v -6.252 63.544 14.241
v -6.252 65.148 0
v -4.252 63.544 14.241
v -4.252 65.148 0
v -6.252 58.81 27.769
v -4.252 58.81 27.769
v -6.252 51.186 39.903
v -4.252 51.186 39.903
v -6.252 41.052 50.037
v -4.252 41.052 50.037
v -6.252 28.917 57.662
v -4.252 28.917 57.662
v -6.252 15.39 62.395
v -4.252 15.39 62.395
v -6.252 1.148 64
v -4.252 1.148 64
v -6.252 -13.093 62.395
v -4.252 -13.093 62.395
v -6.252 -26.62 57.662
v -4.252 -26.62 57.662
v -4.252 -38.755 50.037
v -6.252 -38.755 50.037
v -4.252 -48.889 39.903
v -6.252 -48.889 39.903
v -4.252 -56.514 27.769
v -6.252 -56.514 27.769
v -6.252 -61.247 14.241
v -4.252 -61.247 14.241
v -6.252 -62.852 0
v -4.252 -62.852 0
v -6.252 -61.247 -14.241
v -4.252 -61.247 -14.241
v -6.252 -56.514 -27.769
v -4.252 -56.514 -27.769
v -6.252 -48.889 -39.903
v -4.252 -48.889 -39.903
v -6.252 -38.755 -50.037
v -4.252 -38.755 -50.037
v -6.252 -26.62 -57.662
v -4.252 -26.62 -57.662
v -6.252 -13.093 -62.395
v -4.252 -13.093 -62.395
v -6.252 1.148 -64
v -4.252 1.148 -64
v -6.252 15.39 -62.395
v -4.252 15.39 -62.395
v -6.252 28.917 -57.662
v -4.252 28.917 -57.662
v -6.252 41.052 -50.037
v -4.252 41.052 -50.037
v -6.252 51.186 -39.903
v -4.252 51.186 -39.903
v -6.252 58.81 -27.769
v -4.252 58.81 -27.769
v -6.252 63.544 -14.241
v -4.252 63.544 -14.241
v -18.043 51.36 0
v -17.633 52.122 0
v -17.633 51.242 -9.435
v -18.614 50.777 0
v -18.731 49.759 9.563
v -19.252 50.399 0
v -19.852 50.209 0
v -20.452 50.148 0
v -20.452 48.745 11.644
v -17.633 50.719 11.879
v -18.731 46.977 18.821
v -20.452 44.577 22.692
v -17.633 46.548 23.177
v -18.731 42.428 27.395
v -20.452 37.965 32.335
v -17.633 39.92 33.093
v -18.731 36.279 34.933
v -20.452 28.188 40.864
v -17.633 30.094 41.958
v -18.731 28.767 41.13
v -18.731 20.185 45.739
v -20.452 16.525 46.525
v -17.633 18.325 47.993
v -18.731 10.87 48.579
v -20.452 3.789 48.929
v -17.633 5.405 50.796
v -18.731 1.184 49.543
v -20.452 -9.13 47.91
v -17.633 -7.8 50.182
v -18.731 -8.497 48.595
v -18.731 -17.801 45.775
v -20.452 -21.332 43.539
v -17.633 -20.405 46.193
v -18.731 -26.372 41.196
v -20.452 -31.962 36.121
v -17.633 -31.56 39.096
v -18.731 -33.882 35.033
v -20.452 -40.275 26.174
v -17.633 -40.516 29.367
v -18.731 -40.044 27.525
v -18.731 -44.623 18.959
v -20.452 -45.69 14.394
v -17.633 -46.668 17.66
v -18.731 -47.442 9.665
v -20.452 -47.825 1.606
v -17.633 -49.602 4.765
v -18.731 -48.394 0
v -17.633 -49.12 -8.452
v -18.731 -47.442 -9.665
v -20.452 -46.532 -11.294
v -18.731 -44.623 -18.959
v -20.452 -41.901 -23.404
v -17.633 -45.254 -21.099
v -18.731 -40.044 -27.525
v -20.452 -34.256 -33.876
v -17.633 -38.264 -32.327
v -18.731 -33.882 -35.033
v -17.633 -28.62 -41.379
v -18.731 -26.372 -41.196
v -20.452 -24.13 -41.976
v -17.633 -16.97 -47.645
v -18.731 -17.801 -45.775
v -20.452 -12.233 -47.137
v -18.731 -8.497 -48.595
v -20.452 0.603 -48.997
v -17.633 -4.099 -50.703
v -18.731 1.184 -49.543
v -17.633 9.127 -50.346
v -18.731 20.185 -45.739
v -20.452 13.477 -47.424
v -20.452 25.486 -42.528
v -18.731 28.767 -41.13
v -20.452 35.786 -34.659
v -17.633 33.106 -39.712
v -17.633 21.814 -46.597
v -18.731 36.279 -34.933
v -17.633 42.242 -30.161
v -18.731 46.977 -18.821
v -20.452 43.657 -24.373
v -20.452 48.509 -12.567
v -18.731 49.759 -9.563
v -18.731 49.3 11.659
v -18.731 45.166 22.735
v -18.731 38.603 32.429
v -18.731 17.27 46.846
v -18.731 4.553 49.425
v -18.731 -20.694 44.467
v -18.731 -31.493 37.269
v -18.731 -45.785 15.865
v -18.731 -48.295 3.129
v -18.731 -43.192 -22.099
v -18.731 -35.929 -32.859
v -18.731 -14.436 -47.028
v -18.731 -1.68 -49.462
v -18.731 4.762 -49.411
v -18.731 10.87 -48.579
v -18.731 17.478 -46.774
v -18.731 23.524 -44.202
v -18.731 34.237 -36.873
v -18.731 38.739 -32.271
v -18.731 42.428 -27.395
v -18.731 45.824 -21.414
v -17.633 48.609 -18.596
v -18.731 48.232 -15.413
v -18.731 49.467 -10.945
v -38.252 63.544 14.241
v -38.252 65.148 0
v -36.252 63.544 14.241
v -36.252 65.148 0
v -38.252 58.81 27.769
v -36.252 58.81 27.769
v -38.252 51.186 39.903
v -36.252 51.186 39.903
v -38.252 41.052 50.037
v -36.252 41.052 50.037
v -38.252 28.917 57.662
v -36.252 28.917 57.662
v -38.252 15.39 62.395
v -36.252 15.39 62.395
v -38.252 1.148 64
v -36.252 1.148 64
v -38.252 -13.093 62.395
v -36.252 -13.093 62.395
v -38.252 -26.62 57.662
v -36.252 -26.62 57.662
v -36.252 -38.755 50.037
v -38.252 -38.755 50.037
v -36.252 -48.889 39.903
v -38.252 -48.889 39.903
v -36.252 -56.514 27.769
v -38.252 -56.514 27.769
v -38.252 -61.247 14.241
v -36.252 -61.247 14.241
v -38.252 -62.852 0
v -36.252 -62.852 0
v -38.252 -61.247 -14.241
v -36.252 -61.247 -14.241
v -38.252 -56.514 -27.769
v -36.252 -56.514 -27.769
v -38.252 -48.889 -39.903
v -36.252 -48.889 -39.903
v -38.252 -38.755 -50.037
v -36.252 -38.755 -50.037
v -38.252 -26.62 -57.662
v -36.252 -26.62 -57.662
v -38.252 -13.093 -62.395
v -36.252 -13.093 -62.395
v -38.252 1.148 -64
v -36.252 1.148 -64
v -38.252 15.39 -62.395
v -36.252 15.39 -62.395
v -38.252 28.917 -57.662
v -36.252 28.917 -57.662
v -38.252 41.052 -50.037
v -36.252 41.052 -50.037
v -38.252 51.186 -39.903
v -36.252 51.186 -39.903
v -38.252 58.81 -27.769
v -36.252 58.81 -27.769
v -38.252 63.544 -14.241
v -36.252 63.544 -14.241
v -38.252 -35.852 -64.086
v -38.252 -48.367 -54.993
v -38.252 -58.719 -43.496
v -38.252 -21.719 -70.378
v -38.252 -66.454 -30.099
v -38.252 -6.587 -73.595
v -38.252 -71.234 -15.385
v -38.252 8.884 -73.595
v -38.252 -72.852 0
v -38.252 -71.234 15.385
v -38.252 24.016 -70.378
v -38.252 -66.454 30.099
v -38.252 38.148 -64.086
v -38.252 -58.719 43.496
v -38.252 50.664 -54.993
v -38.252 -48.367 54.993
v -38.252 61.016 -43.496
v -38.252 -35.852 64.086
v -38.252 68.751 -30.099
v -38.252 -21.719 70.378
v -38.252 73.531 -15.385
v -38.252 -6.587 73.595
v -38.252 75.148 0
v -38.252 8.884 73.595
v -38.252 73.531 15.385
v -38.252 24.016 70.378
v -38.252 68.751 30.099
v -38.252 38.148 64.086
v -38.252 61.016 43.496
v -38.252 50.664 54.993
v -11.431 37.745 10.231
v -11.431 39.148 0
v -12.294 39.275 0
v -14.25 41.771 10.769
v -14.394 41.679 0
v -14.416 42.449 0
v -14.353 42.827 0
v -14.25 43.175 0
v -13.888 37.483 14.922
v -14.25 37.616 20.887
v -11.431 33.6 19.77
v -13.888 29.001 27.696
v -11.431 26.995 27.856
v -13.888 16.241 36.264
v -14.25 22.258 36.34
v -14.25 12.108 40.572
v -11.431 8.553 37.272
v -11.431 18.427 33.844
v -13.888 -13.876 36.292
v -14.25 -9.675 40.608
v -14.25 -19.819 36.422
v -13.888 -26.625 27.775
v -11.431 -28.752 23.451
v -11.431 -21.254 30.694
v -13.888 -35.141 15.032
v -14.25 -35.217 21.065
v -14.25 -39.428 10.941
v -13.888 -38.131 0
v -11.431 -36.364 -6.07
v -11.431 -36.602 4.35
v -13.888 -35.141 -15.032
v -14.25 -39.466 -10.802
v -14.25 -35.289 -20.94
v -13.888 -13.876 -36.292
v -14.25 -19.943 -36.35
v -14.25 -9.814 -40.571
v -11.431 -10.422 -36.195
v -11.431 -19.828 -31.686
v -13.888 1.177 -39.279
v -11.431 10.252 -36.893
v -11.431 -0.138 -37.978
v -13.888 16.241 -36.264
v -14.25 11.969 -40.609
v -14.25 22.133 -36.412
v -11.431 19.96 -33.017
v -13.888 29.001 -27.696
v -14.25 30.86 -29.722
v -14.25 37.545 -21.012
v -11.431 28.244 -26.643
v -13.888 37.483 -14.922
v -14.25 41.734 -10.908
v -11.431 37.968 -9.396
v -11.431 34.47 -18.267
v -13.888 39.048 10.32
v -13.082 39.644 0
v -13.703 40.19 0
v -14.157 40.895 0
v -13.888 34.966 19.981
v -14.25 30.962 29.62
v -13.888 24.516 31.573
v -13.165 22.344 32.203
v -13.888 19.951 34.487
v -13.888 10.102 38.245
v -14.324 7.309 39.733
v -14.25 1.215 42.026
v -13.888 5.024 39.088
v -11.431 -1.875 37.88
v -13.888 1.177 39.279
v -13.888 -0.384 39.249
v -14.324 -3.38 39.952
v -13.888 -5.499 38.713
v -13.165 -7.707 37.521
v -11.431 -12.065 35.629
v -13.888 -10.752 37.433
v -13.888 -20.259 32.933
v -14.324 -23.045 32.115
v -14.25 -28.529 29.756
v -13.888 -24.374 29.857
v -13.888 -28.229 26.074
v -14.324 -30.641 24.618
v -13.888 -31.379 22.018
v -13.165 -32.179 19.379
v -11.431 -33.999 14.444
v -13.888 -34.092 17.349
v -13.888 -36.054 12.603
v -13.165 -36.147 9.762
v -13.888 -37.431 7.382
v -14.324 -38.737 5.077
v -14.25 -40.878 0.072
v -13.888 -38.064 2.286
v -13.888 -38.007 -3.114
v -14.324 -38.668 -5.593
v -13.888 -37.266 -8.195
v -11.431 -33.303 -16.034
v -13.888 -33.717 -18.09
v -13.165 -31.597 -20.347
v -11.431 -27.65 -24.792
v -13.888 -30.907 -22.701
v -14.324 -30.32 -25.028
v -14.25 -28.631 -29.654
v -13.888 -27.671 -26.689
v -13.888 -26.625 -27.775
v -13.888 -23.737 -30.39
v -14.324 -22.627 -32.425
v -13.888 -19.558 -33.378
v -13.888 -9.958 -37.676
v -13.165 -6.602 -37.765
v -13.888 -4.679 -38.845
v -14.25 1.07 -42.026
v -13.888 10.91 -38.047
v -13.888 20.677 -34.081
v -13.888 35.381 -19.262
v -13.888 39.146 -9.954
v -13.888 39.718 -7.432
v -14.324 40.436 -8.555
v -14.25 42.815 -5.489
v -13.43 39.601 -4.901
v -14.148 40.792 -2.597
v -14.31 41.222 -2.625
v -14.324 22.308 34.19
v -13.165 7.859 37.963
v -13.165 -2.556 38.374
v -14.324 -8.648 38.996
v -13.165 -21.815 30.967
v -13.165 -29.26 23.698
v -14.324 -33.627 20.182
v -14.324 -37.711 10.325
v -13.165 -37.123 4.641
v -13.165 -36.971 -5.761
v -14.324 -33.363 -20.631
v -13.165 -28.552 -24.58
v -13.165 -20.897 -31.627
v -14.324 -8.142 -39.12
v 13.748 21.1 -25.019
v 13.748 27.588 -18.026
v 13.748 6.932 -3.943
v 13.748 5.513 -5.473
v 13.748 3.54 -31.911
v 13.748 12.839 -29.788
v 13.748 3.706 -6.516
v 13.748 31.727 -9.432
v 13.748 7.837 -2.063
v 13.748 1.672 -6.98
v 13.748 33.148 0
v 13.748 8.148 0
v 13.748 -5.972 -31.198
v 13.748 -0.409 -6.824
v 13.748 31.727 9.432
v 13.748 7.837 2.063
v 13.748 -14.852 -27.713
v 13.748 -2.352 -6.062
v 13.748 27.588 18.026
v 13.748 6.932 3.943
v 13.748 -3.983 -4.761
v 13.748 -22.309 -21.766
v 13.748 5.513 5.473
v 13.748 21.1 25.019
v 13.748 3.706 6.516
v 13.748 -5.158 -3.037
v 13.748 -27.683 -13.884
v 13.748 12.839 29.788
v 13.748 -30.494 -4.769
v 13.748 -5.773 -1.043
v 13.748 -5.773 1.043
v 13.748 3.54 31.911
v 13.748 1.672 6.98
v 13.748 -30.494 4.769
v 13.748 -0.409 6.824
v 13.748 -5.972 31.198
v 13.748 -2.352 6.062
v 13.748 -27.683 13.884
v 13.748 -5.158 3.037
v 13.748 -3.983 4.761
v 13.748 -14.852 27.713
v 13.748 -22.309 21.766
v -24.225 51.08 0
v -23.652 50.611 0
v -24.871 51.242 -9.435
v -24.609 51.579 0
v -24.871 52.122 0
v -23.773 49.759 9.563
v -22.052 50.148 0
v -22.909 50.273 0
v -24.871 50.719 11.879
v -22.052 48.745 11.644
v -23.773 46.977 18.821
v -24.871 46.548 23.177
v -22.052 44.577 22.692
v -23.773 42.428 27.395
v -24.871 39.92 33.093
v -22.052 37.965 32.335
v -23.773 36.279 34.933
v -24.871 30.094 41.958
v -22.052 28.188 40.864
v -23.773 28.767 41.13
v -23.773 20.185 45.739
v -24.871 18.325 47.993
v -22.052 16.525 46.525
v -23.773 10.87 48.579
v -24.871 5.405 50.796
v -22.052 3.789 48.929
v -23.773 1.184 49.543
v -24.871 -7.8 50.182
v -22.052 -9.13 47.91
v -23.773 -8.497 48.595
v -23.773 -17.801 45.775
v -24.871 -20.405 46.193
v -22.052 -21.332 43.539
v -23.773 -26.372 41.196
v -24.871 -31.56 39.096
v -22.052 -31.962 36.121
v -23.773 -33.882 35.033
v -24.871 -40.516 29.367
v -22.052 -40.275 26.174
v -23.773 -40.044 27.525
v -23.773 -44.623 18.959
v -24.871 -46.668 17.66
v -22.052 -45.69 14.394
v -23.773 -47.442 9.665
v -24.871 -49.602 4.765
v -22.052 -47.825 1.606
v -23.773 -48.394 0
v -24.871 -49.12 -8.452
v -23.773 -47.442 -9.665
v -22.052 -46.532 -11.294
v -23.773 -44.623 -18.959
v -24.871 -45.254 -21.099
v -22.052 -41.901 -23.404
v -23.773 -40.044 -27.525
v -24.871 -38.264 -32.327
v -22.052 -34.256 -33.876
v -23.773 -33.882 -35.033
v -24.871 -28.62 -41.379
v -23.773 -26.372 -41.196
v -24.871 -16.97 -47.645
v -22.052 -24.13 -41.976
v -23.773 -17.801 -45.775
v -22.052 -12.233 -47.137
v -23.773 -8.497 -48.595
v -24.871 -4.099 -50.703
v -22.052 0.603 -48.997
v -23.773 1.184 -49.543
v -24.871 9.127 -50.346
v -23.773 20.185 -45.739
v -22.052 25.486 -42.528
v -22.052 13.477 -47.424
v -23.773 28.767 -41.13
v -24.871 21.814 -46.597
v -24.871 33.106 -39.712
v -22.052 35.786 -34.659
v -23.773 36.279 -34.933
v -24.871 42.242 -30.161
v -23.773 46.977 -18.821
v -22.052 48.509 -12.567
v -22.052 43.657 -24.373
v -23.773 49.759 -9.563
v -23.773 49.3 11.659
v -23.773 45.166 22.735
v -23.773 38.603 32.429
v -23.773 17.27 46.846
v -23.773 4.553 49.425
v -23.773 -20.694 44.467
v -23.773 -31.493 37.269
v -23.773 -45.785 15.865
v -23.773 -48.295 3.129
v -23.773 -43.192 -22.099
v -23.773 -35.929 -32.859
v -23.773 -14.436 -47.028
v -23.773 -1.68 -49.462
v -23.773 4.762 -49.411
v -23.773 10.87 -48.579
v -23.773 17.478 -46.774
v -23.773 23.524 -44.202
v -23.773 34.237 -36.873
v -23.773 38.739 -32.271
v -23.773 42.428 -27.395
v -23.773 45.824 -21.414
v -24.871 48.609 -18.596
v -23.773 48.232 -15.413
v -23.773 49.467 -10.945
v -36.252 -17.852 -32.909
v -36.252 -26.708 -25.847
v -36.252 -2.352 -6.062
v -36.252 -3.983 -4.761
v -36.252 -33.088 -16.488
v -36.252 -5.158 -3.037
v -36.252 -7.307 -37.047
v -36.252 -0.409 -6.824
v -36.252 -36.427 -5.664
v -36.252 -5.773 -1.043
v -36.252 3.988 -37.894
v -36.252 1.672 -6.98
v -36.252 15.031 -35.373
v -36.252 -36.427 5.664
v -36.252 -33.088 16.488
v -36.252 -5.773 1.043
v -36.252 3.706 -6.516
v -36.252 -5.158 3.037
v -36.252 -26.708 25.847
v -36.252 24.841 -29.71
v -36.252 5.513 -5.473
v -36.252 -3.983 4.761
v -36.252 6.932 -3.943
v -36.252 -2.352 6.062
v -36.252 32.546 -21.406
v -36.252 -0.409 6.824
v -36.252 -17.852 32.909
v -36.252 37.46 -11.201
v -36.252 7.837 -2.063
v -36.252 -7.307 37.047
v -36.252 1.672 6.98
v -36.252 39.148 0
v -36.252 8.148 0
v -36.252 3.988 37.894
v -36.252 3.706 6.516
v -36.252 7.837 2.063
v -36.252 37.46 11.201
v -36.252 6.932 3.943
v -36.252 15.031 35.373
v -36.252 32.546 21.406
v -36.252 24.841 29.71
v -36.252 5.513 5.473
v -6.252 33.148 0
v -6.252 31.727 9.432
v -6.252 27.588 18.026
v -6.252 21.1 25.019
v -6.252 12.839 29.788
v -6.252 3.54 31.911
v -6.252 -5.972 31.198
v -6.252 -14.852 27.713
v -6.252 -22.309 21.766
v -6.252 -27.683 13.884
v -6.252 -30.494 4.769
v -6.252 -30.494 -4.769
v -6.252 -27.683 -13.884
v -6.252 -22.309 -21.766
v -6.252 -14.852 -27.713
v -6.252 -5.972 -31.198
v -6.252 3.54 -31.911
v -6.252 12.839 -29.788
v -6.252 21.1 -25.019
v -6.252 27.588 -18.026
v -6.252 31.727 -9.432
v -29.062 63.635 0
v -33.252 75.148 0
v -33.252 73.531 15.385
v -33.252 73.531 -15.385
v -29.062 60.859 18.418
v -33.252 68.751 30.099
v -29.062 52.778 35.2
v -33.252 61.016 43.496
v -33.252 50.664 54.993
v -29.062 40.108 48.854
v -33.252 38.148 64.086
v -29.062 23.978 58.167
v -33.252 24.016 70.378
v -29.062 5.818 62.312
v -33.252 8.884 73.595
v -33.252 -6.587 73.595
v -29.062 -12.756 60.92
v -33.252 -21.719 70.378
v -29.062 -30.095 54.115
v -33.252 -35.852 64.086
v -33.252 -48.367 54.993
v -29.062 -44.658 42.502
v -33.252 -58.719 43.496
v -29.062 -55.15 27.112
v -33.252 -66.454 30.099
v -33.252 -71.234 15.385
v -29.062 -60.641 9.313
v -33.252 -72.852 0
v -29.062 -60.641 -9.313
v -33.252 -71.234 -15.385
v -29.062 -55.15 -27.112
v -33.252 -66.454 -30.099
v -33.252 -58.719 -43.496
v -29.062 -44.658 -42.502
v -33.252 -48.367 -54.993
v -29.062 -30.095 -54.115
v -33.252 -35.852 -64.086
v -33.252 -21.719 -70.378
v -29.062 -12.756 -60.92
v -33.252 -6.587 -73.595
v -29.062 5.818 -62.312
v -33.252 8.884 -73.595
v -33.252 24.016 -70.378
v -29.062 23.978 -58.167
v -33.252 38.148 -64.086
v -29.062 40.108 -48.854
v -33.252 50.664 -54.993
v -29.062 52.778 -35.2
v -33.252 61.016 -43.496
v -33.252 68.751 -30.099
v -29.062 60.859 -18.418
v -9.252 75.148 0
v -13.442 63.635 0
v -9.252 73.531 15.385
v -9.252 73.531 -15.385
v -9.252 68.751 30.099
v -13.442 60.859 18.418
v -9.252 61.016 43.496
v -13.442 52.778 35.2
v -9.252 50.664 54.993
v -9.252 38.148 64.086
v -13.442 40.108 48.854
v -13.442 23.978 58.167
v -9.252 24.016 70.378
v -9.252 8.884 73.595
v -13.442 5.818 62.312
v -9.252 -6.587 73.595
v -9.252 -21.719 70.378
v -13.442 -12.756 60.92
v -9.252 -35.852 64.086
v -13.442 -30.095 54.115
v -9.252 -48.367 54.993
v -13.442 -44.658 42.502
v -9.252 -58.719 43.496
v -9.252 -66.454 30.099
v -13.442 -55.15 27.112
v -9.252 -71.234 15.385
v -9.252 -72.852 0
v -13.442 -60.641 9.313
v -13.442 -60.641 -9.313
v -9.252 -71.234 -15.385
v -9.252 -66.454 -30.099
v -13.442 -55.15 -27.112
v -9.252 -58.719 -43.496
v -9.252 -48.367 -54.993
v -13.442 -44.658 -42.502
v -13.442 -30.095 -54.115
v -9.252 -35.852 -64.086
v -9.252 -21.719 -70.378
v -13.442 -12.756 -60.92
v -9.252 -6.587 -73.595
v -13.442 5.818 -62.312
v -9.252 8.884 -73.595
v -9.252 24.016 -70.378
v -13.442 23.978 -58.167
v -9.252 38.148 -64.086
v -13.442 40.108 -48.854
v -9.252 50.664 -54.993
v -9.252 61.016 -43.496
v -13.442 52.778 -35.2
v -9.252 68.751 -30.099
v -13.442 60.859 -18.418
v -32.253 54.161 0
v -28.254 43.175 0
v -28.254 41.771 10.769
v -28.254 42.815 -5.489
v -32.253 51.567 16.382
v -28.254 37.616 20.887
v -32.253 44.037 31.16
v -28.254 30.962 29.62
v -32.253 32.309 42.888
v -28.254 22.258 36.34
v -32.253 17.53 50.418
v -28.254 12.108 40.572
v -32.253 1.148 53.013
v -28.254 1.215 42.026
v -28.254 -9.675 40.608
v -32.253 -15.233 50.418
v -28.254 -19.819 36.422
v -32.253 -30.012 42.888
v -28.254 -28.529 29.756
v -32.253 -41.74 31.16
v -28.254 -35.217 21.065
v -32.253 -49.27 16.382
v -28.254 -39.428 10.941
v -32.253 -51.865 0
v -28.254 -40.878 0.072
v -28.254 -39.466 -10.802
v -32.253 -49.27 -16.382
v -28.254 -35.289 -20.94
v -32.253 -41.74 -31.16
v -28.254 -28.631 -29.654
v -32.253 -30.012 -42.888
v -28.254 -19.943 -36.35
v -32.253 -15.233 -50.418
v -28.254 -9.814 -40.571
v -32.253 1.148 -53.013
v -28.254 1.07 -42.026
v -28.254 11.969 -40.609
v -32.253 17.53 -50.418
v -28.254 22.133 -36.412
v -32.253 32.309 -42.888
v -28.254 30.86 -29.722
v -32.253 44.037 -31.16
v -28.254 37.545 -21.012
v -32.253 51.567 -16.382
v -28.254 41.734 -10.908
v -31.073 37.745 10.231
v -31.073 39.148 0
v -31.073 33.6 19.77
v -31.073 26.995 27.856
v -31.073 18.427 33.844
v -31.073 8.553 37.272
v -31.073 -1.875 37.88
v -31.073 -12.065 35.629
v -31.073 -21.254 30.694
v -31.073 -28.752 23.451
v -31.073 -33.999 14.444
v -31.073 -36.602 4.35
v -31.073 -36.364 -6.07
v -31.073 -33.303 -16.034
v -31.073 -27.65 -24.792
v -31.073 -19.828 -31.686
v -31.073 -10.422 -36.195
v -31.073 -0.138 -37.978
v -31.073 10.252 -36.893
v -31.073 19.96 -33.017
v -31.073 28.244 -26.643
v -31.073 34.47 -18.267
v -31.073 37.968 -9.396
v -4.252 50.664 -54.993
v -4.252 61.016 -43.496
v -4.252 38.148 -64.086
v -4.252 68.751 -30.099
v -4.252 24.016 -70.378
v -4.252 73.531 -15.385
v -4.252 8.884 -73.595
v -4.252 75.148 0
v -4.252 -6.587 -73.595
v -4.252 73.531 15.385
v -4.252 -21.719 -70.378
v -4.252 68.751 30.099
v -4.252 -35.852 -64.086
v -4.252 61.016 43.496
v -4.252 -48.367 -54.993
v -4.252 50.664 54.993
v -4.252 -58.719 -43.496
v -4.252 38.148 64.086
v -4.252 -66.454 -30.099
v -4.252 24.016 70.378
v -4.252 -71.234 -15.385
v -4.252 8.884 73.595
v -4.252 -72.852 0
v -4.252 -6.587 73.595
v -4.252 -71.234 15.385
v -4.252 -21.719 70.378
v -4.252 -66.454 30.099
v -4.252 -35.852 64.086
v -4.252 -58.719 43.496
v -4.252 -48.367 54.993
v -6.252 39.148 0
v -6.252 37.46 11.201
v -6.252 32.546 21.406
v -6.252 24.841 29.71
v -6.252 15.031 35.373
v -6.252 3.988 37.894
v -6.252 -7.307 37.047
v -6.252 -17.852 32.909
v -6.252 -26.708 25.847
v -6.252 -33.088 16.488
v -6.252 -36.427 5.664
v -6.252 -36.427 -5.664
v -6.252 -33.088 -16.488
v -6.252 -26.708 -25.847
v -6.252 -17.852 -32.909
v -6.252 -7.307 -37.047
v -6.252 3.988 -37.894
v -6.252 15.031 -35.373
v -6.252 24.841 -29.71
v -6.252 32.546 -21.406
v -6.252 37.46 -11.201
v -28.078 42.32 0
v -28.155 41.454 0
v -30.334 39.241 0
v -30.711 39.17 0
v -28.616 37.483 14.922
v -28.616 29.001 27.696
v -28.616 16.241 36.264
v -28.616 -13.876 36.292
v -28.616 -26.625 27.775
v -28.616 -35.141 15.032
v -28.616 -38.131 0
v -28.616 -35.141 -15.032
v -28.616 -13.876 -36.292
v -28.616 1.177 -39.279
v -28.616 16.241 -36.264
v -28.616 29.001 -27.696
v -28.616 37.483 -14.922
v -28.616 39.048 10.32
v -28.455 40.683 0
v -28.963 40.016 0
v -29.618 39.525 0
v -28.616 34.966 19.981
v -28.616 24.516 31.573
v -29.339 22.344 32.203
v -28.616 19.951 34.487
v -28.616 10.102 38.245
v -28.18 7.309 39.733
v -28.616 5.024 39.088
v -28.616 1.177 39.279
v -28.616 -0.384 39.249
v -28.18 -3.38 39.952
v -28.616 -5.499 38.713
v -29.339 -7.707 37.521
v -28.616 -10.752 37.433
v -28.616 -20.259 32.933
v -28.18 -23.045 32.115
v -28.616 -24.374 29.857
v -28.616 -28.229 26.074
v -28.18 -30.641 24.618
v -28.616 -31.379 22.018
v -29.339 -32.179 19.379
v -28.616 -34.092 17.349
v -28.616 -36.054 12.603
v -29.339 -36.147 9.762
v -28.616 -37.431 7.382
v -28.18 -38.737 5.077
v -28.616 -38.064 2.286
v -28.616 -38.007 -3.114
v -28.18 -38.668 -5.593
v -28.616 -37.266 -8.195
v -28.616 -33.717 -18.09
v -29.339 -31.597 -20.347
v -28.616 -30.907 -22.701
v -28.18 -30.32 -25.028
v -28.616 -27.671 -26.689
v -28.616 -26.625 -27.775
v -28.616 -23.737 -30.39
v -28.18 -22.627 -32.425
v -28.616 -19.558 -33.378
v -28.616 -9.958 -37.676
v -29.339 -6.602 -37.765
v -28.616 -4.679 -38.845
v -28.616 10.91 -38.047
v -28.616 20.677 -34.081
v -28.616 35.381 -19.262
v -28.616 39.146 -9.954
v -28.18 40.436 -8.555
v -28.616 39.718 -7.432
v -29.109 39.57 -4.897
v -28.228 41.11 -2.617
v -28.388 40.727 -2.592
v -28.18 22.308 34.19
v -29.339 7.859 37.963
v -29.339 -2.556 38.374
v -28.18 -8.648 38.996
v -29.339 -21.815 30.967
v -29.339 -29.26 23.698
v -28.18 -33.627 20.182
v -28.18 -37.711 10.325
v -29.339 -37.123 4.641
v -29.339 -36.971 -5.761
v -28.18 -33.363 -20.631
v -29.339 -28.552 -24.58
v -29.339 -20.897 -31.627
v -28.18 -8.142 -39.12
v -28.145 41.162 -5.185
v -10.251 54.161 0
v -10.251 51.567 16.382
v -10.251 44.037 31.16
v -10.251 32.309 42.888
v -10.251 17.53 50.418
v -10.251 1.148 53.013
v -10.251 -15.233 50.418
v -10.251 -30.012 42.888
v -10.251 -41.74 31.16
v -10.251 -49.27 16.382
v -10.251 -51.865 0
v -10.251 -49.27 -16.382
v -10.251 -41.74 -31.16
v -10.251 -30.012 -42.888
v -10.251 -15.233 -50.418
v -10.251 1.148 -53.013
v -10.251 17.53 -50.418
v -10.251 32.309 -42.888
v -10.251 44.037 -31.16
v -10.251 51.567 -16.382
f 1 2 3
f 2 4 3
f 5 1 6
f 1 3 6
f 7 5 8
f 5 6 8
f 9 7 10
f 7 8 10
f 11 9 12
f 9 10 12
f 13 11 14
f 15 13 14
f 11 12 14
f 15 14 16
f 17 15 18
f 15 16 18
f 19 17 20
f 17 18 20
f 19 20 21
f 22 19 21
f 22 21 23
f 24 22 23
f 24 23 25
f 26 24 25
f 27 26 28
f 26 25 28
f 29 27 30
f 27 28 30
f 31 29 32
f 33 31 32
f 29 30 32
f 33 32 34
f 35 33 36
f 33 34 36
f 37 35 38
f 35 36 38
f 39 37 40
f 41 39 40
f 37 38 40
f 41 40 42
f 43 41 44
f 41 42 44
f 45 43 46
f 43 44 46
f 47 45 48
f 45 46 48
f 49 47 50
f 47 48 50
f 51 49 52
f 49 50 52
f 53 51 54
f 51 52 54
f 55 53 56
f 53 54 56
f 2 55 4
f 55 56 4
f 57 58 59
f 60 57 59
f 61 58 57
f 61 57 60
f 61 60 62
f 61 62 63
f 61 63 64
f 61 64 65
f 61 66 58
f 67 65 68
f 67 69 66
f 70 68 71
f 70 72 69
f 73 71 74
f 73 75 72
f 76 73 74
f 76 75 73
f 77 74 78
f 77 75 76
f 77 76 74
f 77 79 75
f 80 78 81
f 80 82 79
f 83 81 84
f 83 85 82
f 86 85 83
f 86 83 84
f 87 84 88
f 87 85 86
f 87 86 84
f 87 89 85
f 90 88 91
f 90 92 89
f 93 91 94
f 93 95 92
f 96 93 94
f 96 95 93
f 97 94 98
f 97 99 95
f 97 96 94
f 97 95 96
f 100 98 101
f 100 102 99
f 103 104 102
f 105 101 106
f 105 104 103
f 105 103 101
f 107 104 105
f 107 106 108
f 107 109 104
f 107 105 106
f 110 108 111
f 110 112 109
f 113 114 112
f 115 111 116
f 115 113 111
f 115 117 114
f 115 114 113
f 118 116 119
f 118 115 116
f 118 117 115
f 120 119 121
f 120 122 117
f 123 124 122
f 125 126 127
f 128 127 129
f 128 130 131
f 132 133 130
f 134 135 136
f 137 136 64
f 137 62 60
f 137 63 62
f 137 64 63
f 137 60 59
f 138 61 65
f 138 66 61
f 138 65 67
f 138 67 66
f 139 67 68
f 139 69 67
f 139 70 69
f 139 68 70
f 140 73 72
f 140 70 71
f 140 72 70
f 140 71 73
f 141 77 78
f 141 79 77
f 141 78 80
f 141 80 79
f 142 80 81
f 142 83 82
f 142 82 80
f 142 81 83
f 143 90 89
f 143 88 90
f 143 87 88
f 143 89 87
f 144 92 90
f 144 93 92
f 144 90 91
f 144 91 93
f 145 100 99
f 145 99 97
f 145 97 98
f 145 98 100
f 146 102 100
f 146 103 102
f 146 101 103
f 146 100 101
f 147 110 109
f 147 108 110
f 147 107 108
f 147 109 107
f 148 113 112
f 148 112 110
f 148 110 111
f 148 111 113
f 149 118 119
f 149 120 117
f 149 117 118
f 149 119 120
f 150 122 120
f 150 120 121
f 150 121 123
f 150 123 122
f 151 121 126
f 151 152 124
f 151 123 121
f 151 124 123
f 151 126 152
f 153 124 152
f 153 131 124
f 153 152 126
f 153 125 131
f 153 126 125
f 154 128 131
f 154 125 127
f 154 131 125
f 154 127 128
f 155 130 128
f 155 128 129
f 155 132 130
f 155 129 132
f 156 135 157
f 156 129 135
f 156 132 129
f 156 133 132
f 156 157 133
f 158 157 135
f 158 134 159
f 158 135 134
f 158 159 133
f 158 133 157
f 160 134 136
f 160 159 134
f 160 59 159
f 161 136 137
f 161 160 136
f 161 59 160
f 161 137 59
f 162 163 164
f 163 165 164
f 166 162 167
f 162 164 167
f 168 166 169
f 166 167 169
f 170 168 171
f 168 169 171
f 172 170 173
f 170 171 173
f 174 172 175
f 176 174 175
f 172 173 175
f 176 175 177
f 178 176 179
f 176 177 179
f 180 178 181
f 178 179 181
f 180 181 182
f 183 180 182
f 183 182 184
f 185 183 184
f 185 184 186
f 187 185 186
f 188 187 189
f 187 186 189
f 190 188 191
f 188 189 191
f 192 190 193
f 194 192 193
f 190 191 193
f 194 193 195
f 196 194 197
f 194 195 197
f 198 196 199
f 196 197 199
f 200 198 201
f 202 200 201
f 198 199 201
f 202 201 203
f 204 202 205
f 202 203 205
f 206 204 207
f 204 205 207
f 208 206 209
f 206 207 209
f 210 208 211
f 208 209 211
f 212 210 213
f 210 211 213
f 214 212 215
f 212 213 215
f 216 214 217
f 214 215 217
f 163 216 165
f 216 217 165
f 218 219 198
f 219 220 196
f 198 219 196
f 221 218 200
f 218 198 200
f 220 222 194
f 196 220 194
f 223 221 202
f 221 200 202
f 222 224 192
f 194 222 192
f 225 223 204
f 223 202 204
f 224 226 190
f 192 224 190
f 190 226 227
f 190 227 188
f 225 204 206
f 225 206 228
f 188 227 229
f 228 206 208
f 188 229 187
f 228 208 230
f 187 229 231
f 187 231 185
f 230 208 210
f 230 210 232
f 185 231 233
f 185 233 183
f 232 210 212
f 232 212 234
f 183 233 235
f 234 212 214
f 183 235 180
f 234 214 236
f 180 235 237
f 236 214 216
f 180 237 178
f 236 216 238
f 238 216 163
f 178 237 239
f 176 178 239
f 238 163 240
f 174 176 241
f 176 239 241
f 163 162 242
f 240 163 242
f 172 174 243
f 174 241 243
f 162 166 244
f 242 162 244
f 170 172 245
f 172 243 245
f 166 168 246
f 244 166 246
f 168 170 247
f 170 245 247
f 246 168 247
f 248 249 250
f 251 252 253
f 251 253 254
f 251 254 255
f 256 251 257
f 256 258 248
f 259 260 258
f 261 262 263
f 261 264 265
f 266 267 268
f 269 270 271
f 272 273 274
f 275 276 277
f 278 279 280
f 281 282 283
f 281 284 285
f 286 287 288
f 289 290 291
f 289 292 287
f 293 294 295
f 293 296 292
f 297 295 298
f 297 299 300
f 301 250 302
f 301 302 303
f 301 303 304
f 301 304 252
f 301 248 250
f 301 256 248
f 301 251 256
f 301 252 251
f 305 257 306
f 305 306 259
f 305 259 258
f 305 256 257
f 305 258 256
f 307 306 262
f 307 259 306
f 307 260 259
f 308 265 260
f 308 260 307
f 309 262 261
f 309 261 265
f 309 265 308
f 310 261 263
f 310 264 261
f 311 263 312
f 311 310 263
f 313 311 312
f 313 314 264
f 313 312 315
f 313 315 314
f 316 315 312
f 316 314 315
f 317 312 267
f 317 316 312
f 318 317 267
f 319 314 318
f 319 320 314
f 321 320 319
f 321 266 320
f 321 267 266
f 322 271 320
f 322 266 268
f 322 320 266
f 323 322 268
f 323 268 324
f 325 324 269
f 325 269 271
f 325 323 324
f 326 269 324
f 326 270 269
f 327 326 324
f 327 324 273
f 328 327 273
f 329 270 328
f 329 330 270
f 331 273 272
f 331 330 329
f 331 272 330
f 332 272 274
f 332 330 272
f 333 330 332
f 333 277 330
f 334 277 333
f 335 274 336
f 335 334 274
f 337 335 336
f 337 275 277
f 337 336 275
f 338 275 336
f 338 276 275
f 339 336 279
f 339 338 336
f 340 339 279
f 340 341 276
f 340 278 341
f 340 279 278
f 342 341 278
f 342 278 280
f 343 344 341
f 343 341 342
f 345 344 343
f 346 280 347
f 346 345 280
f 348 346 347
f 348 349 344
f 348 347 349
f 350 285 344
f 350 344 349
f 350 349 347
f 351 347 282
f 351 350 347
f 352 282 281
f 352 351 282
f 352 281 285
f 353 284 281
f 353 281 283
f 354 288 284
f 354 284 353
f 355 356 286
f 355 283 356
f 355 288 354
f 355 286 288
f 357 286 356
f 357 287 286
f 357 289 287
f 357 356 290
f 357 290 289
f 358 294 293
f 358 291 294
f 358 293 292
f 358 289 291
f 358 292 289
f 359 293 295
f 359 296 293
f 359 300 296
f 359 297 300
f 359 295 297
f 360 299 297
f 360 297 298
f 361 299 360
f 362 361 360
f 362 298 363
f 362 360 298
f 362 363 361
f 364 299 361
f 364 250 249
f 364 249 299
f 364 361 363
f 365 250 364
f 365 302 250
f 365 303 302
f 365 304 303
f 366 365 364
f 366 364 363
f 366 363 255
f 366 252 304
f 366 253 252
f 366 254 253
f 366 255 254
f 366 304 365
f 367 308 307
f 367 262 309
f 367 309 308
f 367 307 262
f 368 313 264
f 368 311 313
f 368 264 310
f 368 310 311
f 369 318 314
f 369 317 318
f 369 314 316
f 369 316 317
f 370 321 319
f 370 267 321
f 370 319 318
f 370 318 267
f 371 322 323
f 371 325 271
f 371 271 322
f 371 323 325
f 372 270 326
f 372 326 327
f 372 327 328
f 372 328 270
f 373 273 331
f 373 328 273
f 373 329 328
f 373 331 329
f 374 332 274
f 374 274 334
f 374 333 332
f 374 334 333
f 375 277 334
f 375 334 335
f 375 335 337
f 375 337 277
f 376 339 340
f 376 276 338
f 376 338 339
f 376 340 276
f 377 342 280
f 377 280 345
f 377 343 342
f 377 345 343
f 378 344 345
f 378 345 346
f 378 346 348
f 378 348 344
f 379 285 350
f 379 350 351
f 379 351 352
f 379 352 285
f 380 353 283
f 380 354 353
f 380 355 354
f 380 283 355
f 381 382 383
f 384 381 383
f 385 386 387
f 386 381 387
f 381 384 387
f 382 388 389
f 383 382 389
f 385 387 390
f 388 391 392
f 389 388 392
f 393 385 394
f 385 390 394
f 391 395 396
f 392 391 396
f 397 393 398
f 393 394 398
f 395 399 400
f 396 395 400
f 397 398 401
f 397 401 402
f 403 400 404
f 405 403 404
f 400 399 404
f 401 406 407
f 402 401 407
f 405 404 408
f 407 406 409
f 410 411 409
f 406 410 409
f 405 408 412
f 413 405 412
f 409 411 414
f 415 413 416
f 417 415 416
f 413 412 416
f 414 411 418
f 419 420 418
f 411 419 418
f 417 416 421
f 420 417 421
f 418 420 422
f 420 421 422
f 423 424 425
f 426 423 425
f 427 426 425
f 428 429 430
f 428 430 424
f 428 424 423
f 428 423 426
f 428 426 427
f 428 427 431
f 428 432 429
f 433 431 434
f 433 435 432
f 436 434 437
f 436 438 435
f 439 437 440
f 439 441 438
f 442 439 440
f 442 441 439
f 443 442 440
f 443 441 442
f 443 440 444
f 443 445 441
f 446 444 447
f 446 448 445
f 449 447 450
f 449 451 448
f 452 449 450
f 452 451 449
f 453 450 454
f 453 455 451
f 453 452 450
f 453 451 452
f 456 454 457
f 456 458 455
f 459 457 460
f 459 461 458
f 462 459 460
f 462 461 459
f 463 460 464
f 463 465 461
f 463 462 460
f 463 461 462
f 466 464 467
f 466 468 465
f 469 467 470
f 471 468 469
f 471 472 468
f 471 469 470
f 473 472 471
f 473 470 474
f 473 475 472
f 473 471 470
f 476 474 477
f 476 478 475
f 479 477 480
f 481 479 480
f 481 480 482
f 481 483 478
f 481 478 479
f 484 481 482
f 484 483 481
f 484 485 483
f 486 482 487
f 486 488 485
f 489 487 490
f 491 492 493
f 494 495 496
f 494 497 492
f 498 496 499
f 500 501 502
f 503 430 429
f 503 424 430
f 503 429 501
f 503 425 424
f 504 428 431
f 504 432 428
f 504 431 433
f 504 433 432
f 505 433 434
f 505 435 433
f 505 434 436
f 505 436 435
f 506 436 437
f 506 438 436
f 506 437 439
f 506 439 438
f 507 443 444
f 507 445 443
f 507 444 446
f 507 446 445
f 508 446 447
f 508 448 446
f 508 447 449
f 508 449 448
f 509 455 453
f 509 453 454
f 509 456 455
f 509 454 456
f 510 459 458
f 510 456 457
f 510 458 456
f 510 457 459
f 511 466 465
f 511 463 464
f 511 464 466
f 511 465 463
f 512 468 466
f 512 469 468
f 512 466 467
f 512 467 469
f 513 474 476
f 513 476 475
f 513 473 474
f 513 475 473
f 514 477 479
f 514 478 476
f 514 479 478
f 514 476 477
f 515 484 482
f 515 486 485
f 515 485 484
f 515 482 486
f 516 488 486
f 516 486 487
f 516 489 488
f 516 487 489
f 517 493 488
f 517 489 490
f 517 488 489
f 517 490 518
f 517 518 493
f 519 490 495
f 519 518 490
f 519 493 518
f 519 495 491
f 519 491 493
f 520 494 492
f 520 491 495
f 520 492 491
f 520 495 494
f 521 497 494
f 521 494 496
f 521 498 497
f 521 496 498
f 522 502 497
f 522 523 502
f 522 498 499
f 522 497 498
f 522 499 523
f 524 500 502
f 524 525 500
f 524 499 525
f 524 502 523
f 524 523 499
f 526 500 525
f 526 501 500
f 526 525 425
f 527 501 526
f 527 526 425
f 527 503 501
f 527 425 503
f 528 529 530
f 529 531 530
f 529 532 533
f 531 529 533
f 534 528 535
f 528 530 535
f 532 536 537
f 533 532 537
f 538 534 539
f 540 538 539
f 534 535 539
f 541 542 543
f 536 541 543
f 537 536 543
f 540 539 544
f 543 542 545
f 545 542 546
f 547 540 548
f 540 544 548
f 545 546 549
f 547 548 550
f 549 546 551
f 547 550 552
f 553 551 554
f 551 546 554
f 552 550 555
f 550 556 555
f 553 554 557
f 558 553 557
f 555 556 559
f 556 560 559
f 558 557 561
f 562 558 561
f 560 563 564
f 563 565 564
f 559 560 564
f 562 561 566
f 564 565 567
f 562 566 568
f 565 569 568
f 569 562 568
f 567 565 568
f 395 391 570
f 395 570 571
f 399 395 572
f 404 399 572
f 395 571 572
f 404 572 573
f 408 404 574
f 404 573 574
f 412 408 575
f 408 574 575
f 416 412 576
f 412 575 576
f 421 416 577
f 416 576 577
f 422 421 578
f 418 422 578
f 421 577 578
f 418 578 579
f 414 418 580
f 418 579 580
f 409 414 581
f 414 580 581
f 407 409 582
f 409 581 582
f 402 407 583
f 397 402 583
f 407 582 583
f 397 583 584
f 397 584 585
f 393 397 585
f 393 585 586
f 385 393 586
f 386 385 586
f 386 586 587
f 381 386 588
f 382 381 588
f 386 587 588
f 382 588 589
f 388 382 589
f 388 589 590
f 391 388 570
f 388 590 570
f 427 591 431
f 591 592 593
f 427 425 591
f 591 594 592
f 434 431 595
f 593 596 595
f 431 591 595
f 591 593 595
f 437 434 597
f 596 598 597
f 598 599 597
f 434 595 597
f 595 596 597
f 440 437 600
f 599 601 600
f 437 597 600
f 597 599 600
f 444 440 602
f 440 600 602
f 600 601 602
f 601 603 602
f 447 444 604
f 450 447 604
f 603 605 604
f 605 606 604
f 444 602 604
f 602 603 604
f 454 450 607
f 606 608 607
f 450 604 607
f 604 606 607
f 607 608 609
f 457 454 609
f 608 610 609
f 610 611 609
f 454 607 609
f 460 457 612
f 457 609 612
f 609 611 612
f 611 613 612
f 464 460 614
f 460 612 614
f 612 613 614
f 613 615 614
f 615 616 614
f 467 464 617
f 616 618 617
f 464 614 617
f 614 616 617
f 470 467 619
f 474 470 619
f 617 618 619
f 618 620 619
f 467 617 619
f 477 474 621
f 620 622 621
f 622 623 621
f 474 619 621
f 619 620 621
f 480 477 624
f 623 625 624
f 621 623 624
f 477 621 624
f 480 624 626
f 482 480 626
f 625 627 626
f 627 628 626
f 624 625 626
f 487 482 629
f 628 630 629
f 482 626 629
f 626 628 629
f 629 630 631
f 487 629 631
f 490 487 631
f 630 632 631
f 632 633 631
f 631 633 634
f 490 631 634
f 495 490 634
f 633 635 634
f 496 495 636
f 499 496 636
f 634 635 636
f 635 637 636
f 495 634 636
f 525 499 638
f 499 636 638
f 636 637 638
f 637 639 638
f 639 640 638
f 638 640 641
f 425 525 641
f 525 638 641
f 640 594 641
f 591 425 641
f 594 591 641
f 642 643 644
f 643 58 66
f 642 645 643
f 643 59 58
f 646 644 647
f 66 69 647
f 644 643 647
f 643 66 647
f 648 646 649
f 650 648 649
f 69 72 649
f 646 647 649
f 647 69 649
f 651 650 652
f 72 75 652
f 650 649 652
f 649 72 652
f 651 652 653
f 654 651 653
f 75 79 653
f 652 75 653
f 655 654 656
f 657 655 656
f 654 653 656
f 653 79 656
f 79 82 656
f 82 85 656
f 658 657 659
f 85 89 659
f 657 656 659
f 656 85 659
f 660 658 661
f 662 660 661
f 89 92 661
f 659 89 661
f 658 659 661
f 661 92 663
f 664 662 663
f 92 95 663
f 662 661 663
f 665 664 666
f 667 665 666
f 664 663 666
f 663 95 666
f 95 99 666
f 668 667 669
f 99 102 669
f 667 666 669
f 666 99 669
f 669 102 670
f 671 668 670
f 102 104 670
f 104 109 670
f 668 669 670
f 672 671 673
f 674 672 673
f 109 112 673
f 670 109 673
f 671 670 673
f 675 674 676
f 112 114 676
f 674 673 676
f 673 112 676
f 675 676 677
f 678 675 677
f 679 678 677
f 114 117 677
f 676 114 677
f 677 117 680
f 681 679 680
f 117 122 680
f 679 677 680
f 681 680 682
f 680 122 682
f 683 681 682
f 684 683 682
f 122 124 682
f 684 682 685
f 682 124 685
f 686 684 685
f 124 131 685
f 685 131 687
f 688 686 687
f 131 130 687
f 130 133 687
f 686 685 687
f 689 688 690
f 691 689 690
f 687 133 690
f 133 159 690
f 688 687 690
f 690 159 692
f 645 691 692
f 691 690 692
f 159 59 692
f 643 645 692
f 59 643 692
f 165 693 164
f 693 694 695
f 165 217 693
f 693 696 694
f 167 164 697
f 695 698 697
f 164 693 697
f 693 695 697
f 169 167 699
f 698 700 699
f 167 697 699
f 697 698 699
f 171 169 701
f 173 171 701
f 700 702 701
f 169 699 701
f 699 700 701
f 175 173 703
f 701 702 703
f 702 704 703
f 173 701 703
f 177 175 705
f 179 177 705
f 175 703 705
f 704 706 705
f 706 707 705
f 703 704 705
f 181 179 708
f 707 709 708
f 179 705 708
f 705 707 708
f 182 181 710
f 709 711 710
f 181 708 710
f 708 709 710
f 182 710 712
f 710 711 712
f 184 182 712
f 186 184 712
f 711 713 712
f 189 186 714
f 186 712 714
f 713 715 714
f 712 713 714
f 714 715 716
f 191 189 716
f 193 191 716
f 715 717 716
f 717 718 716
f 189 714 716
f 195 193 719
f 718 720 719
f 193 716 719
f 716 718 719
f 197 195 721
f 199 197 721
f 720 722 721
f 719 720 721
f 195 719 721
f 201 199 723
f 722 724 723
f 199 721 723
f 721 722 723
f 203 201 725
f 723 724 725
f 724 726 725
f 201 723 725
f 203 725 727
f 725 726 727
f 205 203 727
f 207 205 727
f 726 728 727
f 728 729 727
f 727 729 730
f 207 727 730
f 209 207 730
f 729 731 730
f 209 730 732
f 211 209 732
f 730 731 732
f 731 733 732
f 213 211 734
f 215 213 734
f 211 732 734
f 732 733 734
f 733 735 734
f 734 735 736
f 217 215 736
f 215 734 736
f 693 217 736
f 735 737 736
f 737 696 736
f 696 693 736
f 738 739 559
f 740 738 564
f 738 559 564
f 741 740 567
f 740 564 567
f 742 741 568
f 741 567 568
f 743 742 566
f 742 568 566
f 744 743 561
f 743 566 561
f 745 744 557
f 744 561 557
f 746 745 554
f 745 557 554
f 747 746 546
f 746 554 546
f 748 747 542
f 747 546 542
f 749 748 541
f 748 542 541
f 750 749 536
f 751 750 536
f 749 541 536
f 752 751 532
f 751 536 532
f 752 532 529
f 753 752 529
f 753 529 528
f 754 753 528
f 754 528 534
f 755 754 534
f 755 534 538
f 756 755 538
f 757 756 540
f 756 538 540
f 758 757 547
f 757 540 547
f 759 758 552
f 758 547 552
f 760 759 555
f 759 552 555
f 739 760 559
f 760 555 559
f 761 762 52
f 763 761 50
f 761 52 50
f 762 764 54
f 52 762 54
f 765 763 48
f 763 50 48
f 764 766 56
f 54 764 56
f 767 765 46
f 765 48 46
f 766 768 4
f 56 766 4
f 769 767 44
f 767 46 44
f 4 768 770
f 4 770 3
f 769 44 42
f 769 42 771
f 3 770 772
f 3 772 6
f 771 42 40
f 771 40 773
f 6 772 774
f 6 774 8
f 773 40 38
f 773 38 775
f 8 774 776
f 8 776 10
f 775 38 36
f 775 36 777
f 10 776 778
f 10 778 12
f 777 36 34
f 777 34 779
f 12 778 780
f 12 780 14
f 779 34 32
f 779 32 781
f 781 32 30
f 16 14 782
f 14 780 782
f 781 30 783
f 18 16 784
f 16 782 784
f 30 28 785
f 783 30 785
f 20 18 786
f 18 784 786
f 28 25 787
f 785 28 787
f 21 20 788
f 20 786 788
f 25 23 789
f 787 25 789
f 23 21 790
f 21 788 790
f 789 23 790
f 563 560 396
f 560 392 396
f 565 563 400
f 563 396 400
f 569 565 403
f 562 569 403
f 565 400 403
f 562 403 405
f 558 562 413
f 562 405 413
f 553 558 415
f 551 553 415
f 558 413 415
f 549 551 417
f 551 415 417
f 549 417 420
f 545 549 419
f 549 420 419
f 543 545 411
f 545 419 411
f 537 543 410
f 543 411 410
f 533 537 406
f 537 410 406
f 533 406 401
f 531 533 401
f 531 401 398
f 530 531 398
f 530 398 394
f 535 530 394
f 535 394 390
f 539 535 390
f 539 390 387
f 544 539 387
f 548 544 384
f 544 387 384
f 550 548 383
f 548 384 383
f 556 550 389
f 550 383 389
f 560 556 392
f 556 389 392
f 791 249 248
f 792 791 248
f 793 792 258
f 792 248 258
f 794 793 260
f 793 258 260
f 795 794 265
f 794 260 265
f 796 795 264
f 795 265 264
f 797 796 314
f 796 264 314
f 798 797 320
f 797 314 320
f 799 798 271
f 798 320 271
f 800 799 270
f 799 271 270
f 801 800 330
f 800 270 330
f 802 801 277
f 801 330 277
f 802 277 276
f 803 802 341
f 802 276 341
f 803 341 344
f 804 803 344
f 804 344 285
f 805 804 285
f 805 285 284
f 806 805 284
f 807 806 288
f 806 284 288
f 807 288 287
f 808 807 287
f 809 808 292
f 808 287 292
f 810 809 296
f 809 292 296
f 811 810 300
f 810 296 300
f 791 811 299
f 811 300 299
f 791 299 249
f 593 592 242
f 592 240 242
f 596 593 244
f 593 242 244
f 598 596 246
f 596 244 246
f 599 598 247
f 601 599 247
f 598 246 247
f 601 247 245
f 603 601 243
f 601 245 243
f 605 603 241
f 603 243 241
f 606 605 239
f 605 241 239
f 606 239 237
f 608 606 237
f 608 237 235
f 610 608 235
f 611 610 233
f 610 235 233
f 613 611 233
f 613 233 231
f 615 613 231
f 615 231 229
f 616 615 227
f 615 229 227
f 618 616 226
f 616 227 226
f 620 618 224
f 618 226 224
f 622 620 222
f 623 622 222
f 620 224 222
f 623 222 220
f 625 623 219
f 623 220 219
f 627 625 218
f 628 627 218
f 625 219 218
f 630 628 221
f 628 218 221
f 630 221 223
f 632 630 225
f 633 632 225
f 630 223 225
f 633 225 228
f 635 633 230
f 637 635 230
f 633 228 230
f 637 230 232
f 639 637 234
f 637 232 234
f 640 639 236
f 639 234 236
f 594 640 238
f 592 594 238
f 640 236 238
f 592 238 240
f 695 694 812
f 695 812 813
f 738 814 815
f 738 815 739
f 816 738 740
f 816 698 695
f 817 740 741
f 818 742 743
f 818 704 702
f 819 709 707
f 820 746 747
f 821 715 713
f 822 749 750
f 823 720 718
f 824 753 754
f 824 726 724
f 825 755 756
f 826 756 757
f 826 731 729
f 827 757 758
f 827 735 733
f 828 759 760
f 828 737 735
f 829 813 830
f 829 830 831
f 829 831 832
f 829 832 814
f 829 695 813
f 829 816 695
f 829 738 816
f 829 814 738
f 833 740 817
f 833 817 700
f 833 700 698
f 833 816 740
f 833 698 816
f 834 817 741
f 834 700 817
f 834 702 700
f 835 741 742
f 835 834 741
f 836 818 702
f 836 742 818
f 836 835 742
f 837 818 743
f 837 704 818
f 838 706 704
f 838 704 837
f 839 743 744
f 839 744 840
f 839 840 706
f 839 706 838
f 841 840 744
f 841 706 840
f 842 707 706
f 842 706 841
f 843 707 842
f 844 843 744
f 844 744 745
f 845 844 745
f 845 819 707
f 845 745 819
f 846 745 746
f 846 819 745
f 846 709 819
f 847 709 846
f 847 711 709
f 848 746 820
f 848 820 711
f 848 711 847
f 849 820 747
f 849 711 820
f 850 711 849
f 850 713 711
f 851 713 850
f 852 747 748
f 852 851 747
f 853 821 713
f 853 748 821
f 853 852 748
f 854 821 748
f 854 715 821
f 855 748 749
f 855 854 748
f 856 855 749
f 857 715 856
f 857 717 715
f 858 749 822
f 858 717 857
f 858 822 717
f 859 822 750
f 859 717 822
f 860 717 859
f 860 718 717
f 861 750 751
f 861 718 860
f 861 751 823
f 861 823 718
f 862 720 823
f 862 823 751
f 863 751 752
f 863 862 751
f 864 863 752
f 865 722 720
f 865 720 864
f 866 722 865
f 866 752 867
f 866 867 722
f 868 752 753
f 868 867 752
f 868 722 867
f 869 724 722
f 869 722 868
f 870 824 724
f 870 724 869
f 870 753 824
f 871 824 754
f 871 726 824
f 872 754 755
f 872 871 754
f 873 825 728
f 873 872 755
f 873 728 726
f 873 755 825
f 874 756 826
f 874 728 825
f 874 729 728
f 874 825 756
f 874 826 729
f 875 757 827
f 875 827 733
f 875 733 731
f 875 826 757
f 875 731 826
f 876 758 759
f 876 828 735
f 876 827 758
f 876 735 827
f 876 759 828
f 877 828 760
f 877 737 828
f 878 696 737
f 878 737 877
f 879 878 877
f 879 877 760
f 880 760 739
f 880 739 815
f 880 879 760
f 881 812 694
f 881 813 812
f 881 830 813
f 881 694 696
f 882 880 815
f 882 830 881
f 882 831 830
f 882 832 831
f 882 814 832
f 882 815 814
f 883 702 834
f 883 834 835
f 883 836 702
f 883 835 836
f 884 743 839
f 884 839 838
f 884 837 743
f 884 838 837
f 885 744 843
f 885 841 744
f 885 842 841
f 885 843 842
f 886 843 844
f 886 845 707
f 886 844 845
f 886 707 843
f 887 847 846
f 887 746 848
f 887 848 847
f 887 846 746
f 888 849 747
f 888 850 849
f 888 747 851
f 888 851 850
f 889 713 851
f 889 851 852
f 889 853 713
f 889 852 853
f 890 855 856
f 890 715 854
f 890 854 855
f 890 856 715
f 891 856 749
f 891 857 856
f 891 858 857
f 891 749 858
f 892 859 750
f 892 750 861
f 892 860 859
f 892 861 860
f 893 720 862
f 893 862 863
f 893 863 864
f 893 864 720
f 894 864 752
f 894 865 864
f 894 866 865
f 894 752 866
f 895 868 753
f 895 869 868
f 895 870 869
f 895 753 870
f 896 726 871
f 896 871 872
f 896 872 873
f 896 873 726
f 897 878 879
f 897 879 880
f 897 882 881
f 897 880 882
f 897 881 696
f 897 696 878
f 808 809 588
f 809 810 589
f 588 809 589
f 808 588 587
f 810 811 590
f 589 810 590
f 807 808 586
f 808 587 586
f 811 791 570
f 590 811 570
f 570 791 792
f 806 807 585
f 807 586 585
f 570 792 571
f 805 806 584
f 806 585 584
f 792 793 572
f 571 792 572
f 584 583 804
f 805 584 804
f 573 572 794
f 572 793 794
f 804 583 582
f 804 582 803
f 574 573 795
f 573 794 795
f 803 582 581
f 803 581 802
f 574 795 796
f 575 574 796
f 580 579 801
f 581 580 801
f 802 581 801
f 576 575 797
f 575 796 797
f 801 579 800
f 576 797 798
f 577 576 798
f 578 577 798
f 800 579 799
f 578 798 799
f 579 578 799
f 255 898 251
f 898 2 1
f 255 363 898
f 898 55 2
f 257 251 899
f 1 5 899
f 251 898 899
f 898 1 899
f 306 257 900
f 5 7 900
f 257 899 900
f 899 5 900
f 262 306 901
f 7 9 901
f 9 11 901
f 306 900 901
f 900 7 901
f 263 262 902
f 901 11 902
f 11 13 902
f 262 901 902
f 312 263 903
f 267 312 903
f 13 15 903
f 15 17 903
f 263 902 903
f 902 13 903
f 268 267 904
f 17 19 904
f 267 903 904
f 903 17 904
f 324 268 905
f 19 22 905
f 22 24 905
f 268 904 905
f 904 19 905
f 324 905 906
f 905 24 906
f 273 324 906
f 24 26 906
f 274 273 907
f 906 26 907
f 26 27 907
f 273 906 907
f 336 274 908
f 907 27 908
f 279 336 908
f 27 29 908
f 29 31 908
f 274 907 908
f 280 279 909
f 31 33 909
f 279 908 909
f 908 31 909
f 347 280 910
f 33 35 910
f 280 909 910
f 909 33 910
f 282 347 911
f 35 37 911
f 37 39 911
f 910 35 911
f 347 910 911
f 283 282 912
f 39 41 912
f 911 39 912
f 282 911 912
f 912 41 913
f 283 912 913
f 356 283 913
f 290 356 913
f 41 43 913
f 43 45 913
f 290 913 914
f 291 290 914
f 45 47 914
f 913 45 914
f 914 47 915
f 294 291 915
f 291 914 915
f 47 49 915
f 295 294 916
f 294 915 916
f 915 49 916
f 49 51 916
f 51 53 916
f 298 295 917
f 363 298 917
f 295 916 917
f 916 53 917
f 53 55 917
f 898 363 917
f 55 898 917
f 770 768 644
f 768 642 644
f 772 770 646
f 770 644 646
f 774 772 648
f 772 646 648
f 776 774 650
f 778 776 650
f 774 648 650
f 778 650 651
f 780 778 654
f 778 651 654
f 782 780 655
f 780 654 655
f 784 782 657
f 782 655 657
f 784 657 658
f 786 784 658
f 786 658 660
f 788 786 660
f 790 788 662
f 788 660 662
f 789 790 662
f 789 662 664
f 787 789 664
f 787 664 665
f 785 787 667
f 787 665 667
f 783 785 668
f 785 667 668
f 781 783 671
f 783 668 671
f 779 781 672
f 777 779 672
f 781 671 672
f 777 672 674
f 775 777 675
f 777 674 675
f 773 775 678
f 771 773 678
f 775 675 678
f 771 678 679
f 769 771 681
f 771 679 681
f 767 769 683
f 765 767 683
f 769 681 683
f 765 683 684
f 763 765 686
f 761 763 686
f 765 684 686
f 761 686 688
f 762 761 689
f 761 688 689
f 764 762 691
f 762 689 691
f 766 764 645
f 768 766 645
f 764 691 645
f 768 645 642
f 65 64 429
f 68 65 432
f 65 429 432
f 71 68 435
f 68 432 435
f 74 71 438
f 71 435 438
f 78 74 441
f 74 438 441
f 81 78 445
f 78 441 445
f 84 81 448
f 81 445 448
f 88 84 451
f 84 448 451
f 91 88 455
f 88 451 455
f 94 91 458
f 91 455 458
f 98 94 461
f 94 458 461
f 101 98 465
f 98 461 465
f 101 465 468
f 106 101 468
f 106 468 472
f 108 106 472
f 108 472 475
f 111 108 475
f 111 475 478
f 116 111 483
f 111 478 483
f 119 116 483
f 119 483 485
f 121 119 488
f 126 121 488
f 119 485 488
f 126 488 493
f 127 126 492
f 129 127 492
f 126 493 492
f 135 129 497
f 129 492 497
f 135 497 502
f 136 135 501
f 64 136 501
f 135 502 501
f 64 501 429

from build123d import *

# Parameters (mm, degrees)
FILLET2_R = 3


with BuildPart() as part:
    # Sketch1 → Revolve1 (revolve)
    with BuildSketch(Plane.XY):
        Polygon((-36.251976392, 8.148460305), (13.748023608, 8.148460305), (13.748023608, 33.148460305), (-6.251976392, 33.148460305), (-6.251976392, 39.148460305), (-15.715202483, 39.148460305), (-6.251976392, 65.148460305), (-4.251976392, 65.148460305), (-4.251976392, 75.148460305), (-9.251976392, 75.148460305), (-18.351232248, 50.148460305), (-24.152720535, 50.148460305), (-33.251976392, 75.148460305), (-38.251976392, 75.148460305), (-38.251976392, 65.148460305), (-36.251976392, 65.148460305), (-26.788750301, 39.148460305), (-36.251976392, 39.148460305), align=None)
    revolve(axis=Axis((-66.203541658, 1.148460305, 0), (1, 0, 0)))

    # Fillet2
    fillet2_edges = [part.edges().sort_by_distance(p)[0] for p in [
        (-26.788750301, -36.851539695, 0),
        (-24.152720535, -47.851539695, 0),
        (-18.351232248, -47.851539695, 0),
        (-15.715202483, -36.851539695, 0),
    ]]
    fillet(fillet2_edges, radius=FILLET2_R)


solid = part.part
